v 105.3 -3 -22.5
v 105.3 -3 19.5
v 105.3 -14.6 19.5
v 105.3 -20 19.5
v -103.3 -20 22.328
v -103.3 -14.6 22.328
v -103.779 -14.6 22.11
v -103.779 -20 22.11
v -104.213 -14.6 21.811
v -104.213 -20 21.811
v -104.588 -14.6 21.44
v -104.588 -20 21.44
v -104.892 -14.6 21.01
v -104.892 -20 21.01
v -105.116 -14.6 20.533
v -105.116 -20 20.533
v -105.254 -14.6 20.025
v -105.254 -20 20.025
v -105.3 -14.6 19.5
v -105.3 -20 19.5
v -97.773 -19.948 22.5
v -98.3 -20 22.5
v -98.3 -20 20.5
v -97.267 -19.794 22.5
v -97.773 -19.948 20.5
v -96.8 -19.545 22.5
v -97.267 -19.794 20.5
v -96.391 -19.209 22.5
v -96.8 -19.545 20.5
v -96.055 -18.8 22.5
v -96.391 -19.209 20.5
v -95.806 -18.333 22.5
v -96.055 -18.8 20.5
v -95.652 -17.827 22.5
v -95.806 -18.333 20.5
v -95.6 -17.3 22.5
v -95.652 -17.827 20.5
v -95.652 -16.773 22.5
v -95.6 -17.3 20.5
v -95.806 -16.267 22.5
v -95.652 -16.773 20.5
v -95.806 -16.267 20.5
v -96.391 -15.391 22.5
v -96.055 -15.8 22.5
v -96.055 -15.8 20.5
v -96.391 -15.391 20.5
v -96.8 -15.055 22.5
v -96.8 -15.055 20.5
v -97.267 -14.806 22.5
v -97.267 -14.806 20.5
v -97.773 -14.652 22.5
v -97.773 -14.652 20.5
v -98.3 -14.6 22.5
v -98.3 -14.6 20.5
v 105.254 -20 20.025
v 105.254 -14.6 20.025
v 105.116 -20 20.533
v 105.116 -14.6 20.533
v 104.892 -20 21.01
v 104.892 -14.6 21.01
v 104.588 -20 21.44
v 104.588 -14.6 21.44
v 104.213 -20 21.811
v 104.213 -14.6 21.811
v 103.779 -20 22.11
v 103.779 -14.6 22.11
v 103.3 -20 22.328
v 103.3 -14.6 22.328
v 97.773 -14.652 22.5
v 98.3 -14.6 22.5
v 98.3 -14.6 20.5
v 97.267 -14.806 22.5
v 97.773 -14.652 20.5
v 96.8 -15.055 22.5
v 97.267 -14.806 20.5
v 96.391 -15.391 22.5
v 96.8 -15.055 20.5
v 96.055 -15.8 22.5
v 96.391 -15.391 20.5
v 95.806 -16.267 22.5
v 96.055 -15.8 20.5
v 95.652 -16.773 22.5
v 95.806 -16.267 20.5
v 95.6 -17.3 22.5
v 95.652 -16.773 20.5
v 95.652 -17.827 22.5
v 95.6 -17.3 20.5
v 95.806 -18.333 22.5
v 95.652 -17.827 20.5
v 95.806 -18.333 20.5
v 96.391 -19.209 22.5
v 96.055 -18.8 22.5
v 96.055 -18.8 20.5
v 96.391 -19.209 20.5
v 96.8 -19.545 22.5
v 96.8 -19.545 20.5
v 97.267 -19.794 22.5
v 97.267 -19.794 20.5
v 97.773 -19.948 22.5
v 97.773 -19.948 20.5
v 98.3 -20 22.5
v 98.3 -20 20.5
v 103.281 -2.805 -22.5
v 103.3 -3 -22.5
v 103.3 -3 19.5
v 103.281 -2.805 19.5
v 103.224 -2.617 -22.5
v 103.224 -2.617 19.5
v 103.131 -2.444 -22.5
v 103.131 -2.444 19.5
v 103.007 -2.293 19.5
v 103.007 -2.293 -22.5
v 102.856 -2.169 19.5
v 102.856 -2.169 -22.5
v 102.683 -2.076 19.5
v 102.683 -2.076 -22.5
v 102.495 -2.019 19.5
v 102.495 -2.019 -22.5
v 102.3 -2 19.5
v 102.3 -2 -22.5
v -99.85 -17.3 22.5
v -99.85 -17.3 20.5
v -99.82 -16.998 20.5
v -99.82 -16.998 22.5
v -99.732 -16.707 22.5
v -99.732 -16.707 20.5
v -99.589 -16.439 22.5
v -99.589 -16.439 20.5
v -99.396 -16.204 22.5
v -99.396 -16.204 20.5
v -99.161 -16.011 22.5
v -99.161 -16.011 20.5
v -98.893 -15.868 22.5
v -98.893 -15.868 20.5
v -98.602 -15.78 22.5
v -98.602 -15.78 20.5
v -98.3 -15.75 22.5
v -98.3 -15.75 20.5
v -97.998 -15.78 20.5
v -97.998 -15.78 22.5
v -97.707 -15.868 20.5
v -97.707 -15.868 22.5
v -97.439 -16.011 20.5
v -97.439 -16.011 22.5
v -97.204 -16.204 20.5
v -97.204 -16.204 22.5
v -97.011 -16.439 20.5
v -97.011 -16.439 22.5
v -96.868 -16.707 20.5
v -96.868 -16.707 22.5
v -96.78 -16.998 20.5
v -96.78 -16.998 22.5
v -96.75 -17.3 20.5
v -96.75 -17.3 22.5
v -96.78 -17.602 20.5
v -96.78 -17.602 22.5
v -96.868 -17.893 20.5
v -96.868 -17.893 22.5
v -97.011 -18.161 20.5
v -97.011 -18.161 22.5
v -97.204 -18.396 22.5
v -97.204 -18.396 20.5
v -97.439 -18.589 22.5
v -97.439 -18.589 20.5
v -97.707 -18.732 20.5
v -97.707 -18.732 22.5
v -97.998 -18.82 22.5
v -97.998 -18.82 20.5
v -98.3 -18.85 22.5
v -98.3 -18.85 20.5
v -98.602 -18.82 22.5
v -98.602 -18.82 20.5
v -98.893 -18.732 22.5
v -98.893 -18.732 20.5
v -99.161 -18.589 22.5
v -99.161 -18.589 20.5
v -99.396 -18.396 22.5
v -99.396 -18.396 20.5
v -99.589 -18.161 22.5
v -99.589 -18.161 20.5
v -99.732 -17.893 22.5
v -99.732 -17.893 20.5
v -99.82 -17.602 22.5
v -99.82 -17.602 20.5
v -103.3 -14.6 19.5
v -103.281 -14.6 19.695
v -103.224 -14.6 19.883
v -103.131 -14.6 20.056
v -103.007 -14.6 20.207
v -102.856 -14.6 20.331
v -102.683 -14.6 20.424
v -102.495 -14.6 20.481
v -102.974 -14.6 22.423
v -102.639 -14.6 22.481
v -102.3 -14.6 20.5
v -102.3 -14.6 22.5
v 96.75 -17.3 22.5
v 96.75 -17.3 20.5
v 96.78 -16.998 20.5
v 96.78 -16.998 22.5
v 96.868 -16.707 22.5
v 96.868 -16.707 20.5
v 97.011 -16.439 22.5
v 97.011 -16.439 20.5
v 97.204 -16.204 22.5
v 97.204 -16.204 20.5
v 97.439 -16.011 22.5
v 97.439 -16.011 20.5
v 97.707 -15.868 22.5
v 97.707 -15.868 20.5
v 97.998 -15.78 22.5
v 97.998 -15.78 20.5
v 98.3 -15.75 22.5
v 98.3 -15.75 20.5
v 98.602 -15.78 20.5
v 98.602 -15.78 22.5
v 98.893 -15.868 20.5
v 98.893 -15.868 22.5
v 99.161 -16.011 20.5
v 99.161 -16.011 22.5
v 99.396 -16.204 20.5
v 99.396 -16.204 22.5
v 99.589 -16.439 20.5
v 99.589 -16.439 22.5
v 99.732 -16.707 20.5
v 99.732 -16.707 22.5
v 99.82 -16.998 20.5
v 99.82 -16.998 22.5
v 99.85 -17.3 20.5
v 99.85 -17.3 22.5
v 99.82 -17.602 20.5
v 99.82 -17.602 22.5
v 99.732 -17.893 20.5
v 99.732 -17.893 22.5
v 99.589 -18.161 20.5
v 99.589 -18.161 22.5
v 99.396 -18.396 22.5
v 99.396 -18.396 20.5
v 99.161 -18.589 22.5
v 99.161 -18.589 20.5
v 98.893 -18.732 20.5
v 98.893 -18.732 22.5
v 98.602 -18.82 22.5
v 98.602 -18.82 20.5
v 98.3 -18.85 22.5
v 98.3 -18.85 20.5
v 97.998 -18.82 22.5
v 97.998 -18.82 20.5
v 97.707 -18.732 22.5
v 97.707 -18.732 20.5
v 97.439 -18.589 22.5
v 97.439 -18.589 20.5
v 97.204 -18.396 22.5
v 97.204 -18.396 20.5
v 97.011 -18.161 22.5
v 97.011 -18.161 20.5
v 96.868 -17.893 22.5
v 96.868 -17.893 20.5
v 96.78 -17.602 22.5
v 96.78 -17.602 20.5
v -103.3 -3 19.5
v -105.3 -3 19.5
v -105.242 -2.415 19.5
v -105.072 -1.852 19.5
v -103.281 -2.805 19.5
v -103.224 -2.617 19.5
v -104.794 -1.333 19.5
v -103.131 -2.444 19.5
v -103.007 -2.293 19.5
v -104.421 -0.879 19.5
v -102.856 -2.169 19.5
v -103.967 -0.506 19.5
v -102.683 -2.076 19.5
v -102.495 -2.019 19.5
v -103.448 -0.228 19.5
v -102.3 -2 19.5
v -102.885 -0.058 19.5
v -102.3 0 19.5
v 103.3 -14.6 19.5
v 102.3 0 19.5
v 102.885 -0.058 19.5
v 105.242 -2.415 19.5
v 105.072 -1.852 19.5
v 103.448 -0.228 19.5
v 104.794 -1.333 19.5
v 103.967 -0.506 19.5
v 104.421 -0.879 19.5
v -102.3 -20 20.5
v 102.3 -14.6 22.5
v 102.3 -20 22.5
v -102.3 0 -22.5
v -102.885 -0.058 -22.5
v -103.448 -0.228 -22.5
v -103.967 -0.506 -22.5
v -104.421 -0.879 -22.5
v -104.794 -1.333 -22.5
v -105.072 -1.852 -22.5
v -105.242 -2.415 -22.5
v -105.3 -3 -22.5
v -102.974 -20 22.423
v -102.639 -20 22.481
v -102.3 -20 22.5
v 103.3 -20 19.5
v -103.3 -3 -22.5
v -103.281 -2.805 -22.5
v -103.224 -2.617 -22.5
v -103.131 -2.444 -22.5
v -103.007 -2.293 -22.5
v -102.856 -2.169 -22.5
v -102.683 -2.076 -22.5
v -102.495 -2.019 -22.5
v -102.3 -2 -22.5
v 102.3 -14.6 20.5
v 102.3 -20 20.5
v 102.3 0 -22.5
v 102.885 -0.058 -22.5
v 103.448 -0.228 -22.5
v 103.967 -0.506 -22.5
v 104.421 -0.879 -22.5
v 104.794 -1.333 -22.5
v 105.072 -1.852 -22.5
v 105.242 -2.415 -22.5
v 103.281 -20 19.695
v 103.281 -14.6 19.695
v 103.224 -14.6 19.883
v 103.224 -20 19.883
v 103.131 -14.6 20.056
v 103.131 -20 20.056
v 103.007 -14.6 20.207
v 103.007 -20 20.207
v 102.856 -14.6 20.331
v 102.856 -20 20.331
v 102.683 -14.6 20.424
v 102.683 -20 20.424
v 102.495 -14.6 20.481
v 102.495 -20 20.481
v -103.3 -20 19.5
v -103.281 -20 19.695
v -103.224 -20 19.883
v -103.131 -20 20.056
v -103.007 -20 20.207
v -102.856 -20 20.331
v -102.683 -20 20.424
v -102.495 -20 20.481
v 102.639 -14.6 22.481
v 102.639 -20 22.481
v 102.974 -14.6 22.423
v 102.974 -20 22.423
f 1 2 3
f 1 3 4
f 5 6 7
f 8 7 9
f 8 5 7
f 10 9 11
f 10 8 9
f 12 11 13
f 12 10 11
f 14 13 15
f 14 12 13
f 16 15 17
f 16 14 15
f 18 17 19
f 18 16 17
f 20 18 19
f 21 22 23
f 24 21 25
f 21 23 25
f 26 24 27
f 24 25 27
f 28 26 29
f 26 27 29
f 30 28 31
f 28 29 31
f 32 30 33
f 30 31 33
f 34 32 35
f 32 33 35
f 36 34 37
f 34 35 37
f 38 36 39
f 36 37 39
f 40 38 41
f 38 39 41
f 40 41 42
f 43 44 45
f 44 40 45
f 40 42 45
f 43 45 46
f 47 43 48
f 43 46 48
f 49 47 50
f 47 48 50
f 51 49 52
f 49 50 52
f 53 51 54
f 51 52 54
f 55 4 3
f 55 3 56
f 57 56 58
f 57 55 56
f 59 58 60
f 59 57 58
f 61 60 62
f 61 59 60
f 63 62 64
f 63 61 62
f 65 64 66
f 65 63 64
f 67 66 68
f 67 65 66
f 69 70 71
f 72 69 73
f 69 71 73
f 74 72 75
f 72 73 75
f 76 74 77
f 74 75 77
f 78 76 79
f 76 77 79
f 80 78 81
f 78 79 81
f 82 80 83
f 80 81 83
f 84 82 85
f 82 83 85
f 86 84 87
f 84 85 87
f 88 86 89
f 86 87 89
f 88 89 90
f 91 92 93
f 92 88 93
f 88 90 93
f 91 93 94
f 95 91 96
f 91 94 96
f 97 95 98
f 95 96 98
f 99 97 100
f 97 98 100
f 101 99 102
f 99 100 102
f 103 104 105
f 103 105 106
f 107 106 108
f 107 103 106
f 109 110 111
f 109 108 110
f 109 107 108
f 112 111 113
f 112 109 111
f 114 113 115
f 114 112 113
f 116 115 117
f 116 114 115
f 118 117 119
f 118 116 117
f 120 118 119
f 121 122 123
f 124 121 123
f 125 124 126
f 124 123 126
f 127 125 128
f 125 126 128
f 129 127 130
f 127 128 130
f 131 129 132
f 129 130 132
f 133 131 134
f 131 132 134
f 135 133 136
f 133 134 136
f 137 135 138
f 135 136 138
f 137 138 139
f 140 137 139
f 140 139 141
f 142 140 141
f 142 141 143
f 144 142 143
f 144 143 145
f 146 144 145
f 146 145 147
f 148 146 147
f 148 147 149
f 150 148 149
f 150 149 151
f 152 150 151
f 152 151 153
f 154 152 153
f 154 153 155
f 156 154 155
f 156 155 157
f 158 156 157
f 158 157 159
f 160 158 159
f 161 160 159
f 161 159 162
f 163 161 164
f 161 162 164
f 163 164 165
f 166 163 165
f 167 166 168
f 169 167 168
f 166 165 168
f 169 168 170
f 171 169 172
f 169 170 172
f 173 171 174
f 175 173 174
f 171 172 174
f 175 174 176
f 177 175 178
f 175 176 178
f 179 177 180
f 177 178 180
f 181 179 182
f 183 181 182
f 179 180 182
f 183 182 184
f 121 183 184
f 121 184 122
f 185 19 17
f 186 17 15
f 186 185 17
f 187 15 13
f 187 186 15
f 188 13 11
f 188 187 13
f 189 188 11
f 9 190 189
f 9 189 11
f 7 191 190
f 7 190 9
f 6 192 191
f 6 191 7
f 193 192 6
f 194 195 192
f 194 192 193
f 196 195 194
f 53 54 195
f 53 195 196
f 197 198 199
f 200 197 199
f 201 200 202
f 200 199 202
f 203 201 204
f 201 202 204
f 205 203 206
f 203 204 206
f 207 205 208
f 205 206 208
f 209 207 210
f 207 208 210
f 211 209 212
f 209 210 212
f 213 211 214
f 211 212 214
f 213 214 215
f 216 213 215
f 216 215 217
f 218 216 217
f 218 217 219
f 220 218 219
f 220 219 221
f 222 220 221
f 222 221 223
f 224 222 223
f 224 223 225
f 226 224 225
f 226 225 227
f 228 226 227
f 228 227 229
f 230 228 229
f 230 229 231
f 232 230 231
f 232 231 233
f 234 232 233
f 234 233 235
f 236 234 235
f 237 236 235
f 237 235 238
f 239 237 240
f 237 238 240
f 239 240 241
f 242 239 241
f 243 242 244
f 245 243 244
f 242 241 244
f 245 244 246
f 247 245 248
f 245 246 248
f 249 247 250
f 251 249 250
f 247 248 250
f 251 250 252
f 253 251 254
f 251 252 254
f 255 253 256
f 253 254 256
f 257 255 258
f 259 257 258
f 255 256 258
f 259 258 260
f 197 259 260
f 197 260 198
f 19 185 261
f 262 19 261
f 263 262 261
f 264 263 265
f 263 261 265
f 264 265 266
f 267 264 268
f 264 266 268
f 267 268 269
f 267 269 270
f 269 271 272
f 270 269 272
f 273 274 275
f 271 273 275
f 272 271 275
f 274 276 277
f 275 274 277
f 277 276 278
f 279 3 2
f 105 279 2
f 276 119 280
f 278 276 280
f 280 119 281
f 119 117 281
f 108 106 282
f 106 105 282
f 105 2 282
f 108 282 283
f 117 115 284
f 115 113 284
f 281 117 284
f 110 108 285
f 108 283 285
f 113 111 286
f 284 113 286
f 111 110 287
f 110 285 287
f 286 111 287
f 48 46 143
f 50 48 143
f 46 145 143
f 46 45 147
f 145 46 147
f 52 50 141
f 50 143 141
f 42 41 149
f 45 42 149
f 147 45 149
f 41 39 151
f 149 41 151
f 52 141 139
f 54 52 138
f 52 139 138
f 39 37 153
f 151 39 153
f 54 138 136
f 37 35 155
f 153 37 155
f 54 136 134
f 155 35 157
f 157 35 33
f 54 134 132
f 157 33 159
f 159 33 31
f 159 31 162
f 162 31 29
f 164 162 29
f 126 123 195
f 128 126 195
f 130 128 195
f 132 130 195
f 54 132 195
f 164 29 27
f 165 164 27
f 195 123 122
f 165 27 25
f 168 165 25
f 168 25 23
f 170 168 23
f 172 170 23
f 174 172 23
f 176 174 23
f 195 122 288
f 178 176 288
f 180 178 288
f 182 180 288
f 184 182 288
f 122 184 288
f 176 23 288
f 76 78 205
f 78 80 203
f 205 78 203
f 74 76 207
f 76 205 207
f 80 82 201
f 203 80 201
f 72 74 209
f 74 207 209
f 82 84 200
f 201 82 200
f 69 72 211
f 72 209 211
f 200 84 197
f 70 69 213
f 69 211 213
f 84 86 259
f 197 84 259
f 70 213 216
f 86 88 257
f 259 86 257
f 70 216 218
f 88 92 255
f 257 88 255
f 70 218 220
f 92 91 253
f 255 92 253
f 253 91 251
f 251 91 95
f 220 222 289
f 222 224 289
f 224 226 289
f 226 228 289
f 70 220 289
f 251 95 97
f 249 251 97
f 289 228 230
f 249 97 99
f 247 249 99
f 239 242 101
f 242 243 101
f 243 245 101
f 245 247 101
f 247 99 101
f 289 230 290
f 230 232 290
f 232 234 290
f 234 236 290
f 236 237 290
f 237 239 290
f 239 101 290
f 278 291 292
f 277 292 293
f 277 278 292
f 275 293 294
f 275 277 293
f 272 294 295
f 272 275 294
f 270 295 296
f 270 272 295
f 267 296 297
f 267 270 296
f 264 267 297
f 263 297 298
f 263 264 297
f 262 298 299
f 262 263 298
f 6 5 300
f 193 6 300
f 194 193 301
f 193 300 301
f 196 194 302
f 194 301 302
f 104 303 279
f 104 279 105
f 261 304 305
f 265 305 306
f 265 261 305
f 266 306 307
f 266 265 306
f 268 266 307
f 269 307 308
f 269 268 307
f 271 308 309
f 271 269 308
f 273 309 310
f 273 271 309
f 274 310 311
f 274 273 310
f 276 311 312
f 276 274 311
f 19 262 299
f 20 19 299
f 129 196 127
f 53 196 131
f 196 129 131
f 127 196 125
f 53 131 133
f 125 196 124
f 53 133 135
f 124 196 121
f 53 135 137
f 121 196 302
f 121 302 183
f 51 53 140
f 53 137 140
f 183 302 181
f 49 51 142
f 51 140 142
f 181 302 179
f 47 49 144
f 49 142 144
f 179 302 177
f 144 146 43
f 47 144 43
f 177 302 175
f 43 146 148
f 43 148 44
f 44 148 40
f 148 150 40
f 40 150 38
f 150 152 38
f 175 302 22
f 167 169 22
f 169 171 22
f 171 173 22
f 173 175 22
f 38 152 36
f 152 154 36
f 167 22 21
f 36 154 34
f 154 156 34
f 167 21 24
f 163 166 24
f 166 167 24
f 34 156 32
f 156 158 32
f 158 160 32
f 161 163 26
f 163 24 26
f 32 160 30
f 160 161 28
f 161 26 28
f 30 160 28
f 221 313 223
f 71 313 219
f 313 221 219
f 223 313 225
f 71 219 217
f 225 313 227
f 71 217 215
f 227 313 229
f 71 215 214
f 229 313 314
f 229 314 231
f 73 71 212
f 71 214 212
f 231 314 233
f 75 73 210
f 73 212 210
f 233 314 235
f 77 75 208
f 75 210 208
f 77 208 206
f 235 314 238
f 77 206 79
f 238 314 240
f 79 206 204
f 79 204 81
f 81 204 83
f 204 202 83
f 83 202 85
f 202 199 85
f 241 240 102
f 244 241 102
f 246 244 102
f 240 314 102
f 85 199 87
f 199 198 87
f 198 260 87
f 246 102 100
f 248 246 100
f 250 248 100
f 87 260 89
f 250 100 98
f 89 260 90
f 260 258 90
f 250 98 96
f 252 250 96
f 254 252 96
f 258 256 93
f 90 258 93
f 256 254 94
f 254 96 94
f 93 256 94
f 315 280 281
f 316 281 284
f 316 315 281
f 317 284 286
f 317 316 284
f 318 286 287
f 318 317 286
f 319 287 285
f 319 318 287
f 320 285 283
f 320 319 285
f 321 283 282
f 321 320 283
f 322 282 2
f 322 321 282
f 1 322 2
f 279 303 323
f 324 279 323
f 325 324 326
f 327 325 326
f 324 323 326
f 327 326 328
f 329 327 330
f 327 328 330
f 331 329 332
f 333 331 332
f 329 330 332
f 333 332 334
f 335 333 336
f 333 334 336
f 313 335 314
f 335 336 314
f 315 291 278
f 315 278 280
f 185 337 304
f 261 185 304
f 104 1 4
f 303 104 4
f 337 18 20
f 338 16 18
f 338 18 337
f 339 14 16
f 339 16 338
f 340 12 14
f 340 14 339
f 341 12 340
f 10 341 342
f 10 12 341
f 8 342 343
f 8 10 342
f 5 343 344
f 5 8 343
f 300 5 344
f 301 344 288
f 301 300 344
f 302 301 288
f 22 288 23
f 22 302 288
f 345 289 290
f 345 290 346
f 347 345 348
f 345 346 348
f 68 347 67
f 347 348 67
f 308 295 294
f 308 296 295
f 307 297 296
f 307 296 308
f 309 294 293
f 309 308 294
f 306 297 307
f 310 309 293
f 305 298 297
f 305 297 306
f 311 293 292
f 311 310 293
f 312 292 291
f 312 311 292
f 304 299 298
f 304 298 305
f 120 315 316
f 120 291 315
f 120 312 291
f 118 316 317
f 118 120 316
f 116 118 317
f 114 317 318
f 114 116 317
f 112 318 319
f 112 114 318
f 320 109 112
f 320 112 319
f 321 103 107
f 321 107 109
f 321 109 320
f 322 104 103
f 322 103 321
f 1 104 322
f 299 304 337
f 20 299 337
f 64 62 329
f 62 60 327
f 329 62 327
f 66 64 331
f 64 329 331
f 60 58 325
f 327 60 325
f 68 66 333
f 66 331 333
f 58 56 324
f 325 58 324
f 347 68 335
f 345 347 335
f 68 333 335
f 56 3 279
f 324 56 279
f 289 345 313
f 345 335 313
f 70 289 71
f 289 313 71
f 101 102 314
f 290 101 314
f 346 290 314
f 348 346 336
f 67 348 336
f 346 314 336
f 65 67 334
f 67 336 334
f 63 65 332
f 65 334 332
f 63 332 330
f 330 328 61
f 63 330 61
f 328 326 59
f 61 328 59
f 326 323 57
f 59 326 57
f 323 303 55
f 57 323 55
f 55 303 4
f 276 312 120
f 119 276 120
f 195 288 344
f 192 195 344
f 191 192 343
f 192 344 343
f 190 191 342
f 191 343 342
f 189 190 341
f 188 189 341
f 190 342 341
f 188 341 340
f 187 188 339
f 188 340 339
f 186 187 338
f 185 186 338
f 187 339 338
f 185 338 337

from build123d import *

# Parameters (mm, degrees)
SKETCH1_W                          = 210.6
SKETCH1_H                          = 45
BASE_FLANGE1_DEPTH                 = 2
SM_EDGE_FLANGE_1_STRIP_W           = 10
SM_EDGE_FLANGE_1_STRIP_H           = 2
SM_EDGE_FLANGE_1_STRIP_CUT_DEPTH   = 45
SM_EDGE_FLANGE_1_STRIP_2_W         = 10
SM_EDGE_FLANGE_1_STRIP_2_H         = 2
SM_EDGE_FLANGE_1_STRIP_CUT_2_DEPTH = 45
SM_EDGE_FLANGE_1_DEPTH             = 45
SM_EDGE_FLANGE_1_BEND_DEPTH        = 45
SM_START                           = -20
SM_EDGE_FLANGE_2_DEPTH             = 20
SM_START_2                         = -3
SM_EDGE_FLANGE_2_2_DEPTH           = 3
SM_EDGE_FLANGE_2_3_DEPTH           = 17
SKETCH18_R                         = 1.55
CUT_EXTRUDE4_DEPTH                 = 10
CUT_EXTRUDE5_DEPTH                 = 213.740710726
CUT_EXTRUDE5_DEPTH_BACK            = 213.740710726
SKETCH22_W                         = 3
SKETCH22_H                         = 2
SKETCH22_H_2                       = 11.6


# Read off the part's stored shape, not the designer's step: Ребро-кромка2
# Sheet-metal steps are written as plain solids
with BuildPart() as part:
    # Sketch1 → Base-Flange1 (new body)
    with BuildSketch(Plane(origin=(0, 0, 0), x_dir=(1, 0, 0), z_dir=(0, 1, 0))):
        Rectangle(SKETCH1_W, SKETCH1_H)
    extrude(amount=-BASE_FLANGE1_DEPTH)

    # Ребро-кромка1 strip (across the edge) → Ребро-кромка1 strip cut (cut)
    with BuildSketch(Plane(origin=(-105.3, -2, 22.5), x_dir=(1, 0, 0), z_dir=(0, 0, -1))):
        with Locations((-2, -1)):
            Rectangle(SM_EDGE_FLANGE_1_STRIP_W, SM_EDGE_FLANGE_1_STRIP_H)
    extrude(amount=SM_EDGE_FLANGE_1_STRIP_CUT_DEPTH, mode=Mode.SUBTRACT)

    # Ребро-кромка1 strip 2 (across the edge) → Ребро-кромка1 strip cut 2 (cut)
    with BuildSketch(Plane(origin=(105.3, -2, -22.5), x_dir=(-1, 0, 0), z_dir=(0, 0, 1))):
        with Locations((-2, -1)):
            Rectangle(SM_EDGE_FLANGE_1_STRIP_2_W, SM_EDGE_FLANGE_1_STRIP_2_H)
    extrude(amount=SM_EDGE_FLANGE_1_STRIP_CUT_2_DEPTH, mode=Mode.SUBTRACT)

    # Ребро-кромка1 section (across the edge) → Ребро-кромка1 (add)
    with BuildSketch(Plane(origin=(-105.3, -2, 22.5), x_dir=(1, 0, 0), z_dir=(0, 0, -1))):
        with BuildLine():
            Line((0, 1), (0, 18))
            Line((0, 18), (2, 18))
            Line((2, 18), (2, 1))
            ThreePointArc((2, 1), (2.292893219, 0.292893219), (3, 0))
            Line((3, 0), (3, -2))
            ThreePointArc((3, -2), (0.878679656, -1.121320344), (0, 1))
        make_face()
    extrude(amount=SM_EDGE_FLANGE_1_DEPTH)

    # Ребро-кромка1 section 2 (across the edge) → Ребро-кромка1 bend (add)
    with BuildSketch(Plane(origin=(105.3, -2, -22.5), x_dir=(-1, 0, 0), z_dir=(0, 0, 1))):
        with BuildLine():
            Line((0, 1), (0, 18))
            Line((0, 18), (2, 18))
            Line((2, 18), (2, 1))
            ThreePointArc((2, 1), (2.292893219, 0.292893219), (3, 0))
            Line((3, 0), (3, -2))
            ThreePointArc((3, -2), (0.878679656, -1.121320344), (0, 1))
        make_face()
    extrude(amount=SM_EDGE_FLANGE_1_BEND_DEPTH)

    # Ребро-кромка2 outline → Ребро-кромка2 (cut)
    with BuildSketch(Plane(origin=(0, 0, 0), x_dir=(1, 0, 0), z_dir=(0, 1, 0)).offset(SM_START)):
        with BuildLine():
            Line((-102.3, -20.5), (-102.3, -19.5))
            Line((-102.3, -19.5), (-103.3, -19.5))
            ThreePointArc((-103.3, -19.5), (-103.007106781, -20.207106781), (-102.3, -20.5))
        make_face()
        with BuildLine():
            ThreePointArc((-102.3, -22.5), (-104.421320344, -21.621320344), (-105.3, -19.5))
            Line((-105.3, -19.5), (-105.3, -22.5))
            Line((-105.3, -22.5), (-102.3, -22.5))
        make_face()
        with BuildLine():
            Line((102.3, -22.5), (105.3, -22.5))
            Line((105.3, -22.5), (105.3, -19.5))
            ThreePointArc((105.3, -19.5), (104.421320344, -21.621320344), (102.3, -22.5))
        make_face()
        with BuildLine():
            Line((102.3, -19.5), (102.3, -20.5))
            ThreePointArc((102.3, -20.5), (103.007106781, -20.207106781), (103.3, -19.5))
            Line((103.3, -19.5), (102.3, -19.5))
        make_face()
    extrude(amount=SM_EDGE_FLANGE_2_DEPTH, mode=Mode.SUBTRACT)

    # Sm Edge Flange 2 2 outline → Sm Edge Flange 2 2 (cut)
    with BuildSketch(Plane(origin=(0, 0, 0), x_dir=(1, 0, 0), z_dir=(0, 1, 0)).offset(SM_START_2)):
        with BuildLine():
            Line((-102.3, -22.5), (-102.3, -20.5))
            ThreePointArc((-102.3, -20.5), (-103.007106781, -20.207106781), (-103.3, -19.5))
            Line((-103.3, -19.5), (-105.3, -19.5))
            ThreePointArc((-105.3, -19.5), (-104.421320344, -21.621320344), (-102.3, -22.5))
        make_face()
        with BuildLine():
            Line((102.3, -20.5), (102.3, -22.5))
            ThreePointArc((102.3, -22.5), (104.421320344, -21.621320344), (105.3, -19.5))
            Line((105.3, -19.5), (103.3, -19.5))
            ThreePointArc((103.3, -19.5), (103.007106781, -20.207106781), (102.3, -20.5))
        make_face()
    extrude(amount=SM_EDGE_FLANGE_2_2_DEPTH, mode=Mode.SUBTRACT)

    # Sm Edge Flange 2 3 outline → Sm Edge Flange 2 3 (add)
    with BuildSketch(Plane(origin=(0, 0, 0), x_dir=(1, 0, 0), z_dir=(0, 1, 0)).offset(SM_START)):
        with BuildLine():
            Line((93.3, -20.5), (93.3, -22.5))
            Line((93.3, -22.5), (102.3, -22.5))
            ThreePointArc((102.3, -22.5), (102.807305936, -22.456795679), (103.3, -22.328427125))
            Line((103.3, -22.328427125), (103.3, -19.5))
            ThreePointArc((103.3, -19.5), (103.007106781, -20.207106781), (102.3, -20.5))
            Line((102.3, -20.5), (93.3, -20.5))
        make_face()
        with BuildLine():
            Line((-93.3, -20.5), (-102.3, -20.5))
            ThreePointArc((-102.3, -20.5), (-103.007106781, -20.207106781), (-103.3, -19.5))
            Line((-103.3, -19.5), (-103.3, -22.328427125))
            ThreePointArc((-103.3, -22.328427125), (-102.807305936, -22.456795679), (-102.3, -22.5))
            Line((-102.3, -22.5), (-93.3, -22.5))
            Line((-93.3, -22.5), (-93.3, -20.5))
        make_face()
    extrude(amount=SM_EDGE_FLANGE_2_3_DEPTH)

    # Sketch18 → Cut-Extrude4 (cut)
    with BuildSketch(Plane(origin=(0, 0, 20.5), x_dir=(-1, 0, 0), z_dir=(0, 0, -1))):
        with Locations((-98.3, -17.3)):
            Circle(SKETCH18_R)
        with Locations((98.3, -17.3)):
            Circle(SKETCH18_R)
        with BuildLine():
            Line((-93.3, -2), (-102.3, -2))
            Line((-102.3, -2), (-102.3, -14.6))
            Line((-102.3, -14.6), (-98.3, -14.6))
            ThreePointArc((-98.3, -14.6), (-95.6, -17.3), (-98.3, -20))
            Line((-98.3, -20), (-93.3, -20))
            Line((-93.3, -20), (-93.3, -14.6))
            Line((-93.3, -14.6), (-93.3, -2))
        make_face()
        with BuildLine():
            Line((93.3, -14.6), (93.3, -20))
            Line((93.3, -20), (98.3, -20))
            ThreePointArc((98.3, -20), (95.6, -17.3), (98.3, -14.6))
            Line((98.3, -14.6), (102.3, -14.6))
            Line((102.3, -14.6), (102.3, -2))
            Line((102.3, -2), (93.3, -2))
            Line((93.3, -2), (93.3, -14.6))
        make_face()
    extrude(amount=-CUT_EXTRUDE4_DEPTH, mode=Mode.SUBTRACT)

    # Sketch22 → Cut-Extrude5 (cut, two sides: drawn at the far end of the back side and taken through both)
    with BuildSketch(Plane.ZY.offset(105.3).offset(-CUT_EXTRUDE5_DEPTH_BACK)):
        with Locations((21, -1)):
            Rectangle(SKETCH22_W, SKETCH22_H)
        Polygon((-22.5, -3), (19.5, -20), (-22.5, -20), align=None)
        with Locations((21, -8.8)):
            Rectangle(SKETCH22_W, SKETCH22_H_2)
    extrude(amount=CUT_EXTRUDE5_DEPTH + CUT_EXTRUDE5_DEPTH_BACK, mode=Mode.SUBTRACT)


solid = part.part
